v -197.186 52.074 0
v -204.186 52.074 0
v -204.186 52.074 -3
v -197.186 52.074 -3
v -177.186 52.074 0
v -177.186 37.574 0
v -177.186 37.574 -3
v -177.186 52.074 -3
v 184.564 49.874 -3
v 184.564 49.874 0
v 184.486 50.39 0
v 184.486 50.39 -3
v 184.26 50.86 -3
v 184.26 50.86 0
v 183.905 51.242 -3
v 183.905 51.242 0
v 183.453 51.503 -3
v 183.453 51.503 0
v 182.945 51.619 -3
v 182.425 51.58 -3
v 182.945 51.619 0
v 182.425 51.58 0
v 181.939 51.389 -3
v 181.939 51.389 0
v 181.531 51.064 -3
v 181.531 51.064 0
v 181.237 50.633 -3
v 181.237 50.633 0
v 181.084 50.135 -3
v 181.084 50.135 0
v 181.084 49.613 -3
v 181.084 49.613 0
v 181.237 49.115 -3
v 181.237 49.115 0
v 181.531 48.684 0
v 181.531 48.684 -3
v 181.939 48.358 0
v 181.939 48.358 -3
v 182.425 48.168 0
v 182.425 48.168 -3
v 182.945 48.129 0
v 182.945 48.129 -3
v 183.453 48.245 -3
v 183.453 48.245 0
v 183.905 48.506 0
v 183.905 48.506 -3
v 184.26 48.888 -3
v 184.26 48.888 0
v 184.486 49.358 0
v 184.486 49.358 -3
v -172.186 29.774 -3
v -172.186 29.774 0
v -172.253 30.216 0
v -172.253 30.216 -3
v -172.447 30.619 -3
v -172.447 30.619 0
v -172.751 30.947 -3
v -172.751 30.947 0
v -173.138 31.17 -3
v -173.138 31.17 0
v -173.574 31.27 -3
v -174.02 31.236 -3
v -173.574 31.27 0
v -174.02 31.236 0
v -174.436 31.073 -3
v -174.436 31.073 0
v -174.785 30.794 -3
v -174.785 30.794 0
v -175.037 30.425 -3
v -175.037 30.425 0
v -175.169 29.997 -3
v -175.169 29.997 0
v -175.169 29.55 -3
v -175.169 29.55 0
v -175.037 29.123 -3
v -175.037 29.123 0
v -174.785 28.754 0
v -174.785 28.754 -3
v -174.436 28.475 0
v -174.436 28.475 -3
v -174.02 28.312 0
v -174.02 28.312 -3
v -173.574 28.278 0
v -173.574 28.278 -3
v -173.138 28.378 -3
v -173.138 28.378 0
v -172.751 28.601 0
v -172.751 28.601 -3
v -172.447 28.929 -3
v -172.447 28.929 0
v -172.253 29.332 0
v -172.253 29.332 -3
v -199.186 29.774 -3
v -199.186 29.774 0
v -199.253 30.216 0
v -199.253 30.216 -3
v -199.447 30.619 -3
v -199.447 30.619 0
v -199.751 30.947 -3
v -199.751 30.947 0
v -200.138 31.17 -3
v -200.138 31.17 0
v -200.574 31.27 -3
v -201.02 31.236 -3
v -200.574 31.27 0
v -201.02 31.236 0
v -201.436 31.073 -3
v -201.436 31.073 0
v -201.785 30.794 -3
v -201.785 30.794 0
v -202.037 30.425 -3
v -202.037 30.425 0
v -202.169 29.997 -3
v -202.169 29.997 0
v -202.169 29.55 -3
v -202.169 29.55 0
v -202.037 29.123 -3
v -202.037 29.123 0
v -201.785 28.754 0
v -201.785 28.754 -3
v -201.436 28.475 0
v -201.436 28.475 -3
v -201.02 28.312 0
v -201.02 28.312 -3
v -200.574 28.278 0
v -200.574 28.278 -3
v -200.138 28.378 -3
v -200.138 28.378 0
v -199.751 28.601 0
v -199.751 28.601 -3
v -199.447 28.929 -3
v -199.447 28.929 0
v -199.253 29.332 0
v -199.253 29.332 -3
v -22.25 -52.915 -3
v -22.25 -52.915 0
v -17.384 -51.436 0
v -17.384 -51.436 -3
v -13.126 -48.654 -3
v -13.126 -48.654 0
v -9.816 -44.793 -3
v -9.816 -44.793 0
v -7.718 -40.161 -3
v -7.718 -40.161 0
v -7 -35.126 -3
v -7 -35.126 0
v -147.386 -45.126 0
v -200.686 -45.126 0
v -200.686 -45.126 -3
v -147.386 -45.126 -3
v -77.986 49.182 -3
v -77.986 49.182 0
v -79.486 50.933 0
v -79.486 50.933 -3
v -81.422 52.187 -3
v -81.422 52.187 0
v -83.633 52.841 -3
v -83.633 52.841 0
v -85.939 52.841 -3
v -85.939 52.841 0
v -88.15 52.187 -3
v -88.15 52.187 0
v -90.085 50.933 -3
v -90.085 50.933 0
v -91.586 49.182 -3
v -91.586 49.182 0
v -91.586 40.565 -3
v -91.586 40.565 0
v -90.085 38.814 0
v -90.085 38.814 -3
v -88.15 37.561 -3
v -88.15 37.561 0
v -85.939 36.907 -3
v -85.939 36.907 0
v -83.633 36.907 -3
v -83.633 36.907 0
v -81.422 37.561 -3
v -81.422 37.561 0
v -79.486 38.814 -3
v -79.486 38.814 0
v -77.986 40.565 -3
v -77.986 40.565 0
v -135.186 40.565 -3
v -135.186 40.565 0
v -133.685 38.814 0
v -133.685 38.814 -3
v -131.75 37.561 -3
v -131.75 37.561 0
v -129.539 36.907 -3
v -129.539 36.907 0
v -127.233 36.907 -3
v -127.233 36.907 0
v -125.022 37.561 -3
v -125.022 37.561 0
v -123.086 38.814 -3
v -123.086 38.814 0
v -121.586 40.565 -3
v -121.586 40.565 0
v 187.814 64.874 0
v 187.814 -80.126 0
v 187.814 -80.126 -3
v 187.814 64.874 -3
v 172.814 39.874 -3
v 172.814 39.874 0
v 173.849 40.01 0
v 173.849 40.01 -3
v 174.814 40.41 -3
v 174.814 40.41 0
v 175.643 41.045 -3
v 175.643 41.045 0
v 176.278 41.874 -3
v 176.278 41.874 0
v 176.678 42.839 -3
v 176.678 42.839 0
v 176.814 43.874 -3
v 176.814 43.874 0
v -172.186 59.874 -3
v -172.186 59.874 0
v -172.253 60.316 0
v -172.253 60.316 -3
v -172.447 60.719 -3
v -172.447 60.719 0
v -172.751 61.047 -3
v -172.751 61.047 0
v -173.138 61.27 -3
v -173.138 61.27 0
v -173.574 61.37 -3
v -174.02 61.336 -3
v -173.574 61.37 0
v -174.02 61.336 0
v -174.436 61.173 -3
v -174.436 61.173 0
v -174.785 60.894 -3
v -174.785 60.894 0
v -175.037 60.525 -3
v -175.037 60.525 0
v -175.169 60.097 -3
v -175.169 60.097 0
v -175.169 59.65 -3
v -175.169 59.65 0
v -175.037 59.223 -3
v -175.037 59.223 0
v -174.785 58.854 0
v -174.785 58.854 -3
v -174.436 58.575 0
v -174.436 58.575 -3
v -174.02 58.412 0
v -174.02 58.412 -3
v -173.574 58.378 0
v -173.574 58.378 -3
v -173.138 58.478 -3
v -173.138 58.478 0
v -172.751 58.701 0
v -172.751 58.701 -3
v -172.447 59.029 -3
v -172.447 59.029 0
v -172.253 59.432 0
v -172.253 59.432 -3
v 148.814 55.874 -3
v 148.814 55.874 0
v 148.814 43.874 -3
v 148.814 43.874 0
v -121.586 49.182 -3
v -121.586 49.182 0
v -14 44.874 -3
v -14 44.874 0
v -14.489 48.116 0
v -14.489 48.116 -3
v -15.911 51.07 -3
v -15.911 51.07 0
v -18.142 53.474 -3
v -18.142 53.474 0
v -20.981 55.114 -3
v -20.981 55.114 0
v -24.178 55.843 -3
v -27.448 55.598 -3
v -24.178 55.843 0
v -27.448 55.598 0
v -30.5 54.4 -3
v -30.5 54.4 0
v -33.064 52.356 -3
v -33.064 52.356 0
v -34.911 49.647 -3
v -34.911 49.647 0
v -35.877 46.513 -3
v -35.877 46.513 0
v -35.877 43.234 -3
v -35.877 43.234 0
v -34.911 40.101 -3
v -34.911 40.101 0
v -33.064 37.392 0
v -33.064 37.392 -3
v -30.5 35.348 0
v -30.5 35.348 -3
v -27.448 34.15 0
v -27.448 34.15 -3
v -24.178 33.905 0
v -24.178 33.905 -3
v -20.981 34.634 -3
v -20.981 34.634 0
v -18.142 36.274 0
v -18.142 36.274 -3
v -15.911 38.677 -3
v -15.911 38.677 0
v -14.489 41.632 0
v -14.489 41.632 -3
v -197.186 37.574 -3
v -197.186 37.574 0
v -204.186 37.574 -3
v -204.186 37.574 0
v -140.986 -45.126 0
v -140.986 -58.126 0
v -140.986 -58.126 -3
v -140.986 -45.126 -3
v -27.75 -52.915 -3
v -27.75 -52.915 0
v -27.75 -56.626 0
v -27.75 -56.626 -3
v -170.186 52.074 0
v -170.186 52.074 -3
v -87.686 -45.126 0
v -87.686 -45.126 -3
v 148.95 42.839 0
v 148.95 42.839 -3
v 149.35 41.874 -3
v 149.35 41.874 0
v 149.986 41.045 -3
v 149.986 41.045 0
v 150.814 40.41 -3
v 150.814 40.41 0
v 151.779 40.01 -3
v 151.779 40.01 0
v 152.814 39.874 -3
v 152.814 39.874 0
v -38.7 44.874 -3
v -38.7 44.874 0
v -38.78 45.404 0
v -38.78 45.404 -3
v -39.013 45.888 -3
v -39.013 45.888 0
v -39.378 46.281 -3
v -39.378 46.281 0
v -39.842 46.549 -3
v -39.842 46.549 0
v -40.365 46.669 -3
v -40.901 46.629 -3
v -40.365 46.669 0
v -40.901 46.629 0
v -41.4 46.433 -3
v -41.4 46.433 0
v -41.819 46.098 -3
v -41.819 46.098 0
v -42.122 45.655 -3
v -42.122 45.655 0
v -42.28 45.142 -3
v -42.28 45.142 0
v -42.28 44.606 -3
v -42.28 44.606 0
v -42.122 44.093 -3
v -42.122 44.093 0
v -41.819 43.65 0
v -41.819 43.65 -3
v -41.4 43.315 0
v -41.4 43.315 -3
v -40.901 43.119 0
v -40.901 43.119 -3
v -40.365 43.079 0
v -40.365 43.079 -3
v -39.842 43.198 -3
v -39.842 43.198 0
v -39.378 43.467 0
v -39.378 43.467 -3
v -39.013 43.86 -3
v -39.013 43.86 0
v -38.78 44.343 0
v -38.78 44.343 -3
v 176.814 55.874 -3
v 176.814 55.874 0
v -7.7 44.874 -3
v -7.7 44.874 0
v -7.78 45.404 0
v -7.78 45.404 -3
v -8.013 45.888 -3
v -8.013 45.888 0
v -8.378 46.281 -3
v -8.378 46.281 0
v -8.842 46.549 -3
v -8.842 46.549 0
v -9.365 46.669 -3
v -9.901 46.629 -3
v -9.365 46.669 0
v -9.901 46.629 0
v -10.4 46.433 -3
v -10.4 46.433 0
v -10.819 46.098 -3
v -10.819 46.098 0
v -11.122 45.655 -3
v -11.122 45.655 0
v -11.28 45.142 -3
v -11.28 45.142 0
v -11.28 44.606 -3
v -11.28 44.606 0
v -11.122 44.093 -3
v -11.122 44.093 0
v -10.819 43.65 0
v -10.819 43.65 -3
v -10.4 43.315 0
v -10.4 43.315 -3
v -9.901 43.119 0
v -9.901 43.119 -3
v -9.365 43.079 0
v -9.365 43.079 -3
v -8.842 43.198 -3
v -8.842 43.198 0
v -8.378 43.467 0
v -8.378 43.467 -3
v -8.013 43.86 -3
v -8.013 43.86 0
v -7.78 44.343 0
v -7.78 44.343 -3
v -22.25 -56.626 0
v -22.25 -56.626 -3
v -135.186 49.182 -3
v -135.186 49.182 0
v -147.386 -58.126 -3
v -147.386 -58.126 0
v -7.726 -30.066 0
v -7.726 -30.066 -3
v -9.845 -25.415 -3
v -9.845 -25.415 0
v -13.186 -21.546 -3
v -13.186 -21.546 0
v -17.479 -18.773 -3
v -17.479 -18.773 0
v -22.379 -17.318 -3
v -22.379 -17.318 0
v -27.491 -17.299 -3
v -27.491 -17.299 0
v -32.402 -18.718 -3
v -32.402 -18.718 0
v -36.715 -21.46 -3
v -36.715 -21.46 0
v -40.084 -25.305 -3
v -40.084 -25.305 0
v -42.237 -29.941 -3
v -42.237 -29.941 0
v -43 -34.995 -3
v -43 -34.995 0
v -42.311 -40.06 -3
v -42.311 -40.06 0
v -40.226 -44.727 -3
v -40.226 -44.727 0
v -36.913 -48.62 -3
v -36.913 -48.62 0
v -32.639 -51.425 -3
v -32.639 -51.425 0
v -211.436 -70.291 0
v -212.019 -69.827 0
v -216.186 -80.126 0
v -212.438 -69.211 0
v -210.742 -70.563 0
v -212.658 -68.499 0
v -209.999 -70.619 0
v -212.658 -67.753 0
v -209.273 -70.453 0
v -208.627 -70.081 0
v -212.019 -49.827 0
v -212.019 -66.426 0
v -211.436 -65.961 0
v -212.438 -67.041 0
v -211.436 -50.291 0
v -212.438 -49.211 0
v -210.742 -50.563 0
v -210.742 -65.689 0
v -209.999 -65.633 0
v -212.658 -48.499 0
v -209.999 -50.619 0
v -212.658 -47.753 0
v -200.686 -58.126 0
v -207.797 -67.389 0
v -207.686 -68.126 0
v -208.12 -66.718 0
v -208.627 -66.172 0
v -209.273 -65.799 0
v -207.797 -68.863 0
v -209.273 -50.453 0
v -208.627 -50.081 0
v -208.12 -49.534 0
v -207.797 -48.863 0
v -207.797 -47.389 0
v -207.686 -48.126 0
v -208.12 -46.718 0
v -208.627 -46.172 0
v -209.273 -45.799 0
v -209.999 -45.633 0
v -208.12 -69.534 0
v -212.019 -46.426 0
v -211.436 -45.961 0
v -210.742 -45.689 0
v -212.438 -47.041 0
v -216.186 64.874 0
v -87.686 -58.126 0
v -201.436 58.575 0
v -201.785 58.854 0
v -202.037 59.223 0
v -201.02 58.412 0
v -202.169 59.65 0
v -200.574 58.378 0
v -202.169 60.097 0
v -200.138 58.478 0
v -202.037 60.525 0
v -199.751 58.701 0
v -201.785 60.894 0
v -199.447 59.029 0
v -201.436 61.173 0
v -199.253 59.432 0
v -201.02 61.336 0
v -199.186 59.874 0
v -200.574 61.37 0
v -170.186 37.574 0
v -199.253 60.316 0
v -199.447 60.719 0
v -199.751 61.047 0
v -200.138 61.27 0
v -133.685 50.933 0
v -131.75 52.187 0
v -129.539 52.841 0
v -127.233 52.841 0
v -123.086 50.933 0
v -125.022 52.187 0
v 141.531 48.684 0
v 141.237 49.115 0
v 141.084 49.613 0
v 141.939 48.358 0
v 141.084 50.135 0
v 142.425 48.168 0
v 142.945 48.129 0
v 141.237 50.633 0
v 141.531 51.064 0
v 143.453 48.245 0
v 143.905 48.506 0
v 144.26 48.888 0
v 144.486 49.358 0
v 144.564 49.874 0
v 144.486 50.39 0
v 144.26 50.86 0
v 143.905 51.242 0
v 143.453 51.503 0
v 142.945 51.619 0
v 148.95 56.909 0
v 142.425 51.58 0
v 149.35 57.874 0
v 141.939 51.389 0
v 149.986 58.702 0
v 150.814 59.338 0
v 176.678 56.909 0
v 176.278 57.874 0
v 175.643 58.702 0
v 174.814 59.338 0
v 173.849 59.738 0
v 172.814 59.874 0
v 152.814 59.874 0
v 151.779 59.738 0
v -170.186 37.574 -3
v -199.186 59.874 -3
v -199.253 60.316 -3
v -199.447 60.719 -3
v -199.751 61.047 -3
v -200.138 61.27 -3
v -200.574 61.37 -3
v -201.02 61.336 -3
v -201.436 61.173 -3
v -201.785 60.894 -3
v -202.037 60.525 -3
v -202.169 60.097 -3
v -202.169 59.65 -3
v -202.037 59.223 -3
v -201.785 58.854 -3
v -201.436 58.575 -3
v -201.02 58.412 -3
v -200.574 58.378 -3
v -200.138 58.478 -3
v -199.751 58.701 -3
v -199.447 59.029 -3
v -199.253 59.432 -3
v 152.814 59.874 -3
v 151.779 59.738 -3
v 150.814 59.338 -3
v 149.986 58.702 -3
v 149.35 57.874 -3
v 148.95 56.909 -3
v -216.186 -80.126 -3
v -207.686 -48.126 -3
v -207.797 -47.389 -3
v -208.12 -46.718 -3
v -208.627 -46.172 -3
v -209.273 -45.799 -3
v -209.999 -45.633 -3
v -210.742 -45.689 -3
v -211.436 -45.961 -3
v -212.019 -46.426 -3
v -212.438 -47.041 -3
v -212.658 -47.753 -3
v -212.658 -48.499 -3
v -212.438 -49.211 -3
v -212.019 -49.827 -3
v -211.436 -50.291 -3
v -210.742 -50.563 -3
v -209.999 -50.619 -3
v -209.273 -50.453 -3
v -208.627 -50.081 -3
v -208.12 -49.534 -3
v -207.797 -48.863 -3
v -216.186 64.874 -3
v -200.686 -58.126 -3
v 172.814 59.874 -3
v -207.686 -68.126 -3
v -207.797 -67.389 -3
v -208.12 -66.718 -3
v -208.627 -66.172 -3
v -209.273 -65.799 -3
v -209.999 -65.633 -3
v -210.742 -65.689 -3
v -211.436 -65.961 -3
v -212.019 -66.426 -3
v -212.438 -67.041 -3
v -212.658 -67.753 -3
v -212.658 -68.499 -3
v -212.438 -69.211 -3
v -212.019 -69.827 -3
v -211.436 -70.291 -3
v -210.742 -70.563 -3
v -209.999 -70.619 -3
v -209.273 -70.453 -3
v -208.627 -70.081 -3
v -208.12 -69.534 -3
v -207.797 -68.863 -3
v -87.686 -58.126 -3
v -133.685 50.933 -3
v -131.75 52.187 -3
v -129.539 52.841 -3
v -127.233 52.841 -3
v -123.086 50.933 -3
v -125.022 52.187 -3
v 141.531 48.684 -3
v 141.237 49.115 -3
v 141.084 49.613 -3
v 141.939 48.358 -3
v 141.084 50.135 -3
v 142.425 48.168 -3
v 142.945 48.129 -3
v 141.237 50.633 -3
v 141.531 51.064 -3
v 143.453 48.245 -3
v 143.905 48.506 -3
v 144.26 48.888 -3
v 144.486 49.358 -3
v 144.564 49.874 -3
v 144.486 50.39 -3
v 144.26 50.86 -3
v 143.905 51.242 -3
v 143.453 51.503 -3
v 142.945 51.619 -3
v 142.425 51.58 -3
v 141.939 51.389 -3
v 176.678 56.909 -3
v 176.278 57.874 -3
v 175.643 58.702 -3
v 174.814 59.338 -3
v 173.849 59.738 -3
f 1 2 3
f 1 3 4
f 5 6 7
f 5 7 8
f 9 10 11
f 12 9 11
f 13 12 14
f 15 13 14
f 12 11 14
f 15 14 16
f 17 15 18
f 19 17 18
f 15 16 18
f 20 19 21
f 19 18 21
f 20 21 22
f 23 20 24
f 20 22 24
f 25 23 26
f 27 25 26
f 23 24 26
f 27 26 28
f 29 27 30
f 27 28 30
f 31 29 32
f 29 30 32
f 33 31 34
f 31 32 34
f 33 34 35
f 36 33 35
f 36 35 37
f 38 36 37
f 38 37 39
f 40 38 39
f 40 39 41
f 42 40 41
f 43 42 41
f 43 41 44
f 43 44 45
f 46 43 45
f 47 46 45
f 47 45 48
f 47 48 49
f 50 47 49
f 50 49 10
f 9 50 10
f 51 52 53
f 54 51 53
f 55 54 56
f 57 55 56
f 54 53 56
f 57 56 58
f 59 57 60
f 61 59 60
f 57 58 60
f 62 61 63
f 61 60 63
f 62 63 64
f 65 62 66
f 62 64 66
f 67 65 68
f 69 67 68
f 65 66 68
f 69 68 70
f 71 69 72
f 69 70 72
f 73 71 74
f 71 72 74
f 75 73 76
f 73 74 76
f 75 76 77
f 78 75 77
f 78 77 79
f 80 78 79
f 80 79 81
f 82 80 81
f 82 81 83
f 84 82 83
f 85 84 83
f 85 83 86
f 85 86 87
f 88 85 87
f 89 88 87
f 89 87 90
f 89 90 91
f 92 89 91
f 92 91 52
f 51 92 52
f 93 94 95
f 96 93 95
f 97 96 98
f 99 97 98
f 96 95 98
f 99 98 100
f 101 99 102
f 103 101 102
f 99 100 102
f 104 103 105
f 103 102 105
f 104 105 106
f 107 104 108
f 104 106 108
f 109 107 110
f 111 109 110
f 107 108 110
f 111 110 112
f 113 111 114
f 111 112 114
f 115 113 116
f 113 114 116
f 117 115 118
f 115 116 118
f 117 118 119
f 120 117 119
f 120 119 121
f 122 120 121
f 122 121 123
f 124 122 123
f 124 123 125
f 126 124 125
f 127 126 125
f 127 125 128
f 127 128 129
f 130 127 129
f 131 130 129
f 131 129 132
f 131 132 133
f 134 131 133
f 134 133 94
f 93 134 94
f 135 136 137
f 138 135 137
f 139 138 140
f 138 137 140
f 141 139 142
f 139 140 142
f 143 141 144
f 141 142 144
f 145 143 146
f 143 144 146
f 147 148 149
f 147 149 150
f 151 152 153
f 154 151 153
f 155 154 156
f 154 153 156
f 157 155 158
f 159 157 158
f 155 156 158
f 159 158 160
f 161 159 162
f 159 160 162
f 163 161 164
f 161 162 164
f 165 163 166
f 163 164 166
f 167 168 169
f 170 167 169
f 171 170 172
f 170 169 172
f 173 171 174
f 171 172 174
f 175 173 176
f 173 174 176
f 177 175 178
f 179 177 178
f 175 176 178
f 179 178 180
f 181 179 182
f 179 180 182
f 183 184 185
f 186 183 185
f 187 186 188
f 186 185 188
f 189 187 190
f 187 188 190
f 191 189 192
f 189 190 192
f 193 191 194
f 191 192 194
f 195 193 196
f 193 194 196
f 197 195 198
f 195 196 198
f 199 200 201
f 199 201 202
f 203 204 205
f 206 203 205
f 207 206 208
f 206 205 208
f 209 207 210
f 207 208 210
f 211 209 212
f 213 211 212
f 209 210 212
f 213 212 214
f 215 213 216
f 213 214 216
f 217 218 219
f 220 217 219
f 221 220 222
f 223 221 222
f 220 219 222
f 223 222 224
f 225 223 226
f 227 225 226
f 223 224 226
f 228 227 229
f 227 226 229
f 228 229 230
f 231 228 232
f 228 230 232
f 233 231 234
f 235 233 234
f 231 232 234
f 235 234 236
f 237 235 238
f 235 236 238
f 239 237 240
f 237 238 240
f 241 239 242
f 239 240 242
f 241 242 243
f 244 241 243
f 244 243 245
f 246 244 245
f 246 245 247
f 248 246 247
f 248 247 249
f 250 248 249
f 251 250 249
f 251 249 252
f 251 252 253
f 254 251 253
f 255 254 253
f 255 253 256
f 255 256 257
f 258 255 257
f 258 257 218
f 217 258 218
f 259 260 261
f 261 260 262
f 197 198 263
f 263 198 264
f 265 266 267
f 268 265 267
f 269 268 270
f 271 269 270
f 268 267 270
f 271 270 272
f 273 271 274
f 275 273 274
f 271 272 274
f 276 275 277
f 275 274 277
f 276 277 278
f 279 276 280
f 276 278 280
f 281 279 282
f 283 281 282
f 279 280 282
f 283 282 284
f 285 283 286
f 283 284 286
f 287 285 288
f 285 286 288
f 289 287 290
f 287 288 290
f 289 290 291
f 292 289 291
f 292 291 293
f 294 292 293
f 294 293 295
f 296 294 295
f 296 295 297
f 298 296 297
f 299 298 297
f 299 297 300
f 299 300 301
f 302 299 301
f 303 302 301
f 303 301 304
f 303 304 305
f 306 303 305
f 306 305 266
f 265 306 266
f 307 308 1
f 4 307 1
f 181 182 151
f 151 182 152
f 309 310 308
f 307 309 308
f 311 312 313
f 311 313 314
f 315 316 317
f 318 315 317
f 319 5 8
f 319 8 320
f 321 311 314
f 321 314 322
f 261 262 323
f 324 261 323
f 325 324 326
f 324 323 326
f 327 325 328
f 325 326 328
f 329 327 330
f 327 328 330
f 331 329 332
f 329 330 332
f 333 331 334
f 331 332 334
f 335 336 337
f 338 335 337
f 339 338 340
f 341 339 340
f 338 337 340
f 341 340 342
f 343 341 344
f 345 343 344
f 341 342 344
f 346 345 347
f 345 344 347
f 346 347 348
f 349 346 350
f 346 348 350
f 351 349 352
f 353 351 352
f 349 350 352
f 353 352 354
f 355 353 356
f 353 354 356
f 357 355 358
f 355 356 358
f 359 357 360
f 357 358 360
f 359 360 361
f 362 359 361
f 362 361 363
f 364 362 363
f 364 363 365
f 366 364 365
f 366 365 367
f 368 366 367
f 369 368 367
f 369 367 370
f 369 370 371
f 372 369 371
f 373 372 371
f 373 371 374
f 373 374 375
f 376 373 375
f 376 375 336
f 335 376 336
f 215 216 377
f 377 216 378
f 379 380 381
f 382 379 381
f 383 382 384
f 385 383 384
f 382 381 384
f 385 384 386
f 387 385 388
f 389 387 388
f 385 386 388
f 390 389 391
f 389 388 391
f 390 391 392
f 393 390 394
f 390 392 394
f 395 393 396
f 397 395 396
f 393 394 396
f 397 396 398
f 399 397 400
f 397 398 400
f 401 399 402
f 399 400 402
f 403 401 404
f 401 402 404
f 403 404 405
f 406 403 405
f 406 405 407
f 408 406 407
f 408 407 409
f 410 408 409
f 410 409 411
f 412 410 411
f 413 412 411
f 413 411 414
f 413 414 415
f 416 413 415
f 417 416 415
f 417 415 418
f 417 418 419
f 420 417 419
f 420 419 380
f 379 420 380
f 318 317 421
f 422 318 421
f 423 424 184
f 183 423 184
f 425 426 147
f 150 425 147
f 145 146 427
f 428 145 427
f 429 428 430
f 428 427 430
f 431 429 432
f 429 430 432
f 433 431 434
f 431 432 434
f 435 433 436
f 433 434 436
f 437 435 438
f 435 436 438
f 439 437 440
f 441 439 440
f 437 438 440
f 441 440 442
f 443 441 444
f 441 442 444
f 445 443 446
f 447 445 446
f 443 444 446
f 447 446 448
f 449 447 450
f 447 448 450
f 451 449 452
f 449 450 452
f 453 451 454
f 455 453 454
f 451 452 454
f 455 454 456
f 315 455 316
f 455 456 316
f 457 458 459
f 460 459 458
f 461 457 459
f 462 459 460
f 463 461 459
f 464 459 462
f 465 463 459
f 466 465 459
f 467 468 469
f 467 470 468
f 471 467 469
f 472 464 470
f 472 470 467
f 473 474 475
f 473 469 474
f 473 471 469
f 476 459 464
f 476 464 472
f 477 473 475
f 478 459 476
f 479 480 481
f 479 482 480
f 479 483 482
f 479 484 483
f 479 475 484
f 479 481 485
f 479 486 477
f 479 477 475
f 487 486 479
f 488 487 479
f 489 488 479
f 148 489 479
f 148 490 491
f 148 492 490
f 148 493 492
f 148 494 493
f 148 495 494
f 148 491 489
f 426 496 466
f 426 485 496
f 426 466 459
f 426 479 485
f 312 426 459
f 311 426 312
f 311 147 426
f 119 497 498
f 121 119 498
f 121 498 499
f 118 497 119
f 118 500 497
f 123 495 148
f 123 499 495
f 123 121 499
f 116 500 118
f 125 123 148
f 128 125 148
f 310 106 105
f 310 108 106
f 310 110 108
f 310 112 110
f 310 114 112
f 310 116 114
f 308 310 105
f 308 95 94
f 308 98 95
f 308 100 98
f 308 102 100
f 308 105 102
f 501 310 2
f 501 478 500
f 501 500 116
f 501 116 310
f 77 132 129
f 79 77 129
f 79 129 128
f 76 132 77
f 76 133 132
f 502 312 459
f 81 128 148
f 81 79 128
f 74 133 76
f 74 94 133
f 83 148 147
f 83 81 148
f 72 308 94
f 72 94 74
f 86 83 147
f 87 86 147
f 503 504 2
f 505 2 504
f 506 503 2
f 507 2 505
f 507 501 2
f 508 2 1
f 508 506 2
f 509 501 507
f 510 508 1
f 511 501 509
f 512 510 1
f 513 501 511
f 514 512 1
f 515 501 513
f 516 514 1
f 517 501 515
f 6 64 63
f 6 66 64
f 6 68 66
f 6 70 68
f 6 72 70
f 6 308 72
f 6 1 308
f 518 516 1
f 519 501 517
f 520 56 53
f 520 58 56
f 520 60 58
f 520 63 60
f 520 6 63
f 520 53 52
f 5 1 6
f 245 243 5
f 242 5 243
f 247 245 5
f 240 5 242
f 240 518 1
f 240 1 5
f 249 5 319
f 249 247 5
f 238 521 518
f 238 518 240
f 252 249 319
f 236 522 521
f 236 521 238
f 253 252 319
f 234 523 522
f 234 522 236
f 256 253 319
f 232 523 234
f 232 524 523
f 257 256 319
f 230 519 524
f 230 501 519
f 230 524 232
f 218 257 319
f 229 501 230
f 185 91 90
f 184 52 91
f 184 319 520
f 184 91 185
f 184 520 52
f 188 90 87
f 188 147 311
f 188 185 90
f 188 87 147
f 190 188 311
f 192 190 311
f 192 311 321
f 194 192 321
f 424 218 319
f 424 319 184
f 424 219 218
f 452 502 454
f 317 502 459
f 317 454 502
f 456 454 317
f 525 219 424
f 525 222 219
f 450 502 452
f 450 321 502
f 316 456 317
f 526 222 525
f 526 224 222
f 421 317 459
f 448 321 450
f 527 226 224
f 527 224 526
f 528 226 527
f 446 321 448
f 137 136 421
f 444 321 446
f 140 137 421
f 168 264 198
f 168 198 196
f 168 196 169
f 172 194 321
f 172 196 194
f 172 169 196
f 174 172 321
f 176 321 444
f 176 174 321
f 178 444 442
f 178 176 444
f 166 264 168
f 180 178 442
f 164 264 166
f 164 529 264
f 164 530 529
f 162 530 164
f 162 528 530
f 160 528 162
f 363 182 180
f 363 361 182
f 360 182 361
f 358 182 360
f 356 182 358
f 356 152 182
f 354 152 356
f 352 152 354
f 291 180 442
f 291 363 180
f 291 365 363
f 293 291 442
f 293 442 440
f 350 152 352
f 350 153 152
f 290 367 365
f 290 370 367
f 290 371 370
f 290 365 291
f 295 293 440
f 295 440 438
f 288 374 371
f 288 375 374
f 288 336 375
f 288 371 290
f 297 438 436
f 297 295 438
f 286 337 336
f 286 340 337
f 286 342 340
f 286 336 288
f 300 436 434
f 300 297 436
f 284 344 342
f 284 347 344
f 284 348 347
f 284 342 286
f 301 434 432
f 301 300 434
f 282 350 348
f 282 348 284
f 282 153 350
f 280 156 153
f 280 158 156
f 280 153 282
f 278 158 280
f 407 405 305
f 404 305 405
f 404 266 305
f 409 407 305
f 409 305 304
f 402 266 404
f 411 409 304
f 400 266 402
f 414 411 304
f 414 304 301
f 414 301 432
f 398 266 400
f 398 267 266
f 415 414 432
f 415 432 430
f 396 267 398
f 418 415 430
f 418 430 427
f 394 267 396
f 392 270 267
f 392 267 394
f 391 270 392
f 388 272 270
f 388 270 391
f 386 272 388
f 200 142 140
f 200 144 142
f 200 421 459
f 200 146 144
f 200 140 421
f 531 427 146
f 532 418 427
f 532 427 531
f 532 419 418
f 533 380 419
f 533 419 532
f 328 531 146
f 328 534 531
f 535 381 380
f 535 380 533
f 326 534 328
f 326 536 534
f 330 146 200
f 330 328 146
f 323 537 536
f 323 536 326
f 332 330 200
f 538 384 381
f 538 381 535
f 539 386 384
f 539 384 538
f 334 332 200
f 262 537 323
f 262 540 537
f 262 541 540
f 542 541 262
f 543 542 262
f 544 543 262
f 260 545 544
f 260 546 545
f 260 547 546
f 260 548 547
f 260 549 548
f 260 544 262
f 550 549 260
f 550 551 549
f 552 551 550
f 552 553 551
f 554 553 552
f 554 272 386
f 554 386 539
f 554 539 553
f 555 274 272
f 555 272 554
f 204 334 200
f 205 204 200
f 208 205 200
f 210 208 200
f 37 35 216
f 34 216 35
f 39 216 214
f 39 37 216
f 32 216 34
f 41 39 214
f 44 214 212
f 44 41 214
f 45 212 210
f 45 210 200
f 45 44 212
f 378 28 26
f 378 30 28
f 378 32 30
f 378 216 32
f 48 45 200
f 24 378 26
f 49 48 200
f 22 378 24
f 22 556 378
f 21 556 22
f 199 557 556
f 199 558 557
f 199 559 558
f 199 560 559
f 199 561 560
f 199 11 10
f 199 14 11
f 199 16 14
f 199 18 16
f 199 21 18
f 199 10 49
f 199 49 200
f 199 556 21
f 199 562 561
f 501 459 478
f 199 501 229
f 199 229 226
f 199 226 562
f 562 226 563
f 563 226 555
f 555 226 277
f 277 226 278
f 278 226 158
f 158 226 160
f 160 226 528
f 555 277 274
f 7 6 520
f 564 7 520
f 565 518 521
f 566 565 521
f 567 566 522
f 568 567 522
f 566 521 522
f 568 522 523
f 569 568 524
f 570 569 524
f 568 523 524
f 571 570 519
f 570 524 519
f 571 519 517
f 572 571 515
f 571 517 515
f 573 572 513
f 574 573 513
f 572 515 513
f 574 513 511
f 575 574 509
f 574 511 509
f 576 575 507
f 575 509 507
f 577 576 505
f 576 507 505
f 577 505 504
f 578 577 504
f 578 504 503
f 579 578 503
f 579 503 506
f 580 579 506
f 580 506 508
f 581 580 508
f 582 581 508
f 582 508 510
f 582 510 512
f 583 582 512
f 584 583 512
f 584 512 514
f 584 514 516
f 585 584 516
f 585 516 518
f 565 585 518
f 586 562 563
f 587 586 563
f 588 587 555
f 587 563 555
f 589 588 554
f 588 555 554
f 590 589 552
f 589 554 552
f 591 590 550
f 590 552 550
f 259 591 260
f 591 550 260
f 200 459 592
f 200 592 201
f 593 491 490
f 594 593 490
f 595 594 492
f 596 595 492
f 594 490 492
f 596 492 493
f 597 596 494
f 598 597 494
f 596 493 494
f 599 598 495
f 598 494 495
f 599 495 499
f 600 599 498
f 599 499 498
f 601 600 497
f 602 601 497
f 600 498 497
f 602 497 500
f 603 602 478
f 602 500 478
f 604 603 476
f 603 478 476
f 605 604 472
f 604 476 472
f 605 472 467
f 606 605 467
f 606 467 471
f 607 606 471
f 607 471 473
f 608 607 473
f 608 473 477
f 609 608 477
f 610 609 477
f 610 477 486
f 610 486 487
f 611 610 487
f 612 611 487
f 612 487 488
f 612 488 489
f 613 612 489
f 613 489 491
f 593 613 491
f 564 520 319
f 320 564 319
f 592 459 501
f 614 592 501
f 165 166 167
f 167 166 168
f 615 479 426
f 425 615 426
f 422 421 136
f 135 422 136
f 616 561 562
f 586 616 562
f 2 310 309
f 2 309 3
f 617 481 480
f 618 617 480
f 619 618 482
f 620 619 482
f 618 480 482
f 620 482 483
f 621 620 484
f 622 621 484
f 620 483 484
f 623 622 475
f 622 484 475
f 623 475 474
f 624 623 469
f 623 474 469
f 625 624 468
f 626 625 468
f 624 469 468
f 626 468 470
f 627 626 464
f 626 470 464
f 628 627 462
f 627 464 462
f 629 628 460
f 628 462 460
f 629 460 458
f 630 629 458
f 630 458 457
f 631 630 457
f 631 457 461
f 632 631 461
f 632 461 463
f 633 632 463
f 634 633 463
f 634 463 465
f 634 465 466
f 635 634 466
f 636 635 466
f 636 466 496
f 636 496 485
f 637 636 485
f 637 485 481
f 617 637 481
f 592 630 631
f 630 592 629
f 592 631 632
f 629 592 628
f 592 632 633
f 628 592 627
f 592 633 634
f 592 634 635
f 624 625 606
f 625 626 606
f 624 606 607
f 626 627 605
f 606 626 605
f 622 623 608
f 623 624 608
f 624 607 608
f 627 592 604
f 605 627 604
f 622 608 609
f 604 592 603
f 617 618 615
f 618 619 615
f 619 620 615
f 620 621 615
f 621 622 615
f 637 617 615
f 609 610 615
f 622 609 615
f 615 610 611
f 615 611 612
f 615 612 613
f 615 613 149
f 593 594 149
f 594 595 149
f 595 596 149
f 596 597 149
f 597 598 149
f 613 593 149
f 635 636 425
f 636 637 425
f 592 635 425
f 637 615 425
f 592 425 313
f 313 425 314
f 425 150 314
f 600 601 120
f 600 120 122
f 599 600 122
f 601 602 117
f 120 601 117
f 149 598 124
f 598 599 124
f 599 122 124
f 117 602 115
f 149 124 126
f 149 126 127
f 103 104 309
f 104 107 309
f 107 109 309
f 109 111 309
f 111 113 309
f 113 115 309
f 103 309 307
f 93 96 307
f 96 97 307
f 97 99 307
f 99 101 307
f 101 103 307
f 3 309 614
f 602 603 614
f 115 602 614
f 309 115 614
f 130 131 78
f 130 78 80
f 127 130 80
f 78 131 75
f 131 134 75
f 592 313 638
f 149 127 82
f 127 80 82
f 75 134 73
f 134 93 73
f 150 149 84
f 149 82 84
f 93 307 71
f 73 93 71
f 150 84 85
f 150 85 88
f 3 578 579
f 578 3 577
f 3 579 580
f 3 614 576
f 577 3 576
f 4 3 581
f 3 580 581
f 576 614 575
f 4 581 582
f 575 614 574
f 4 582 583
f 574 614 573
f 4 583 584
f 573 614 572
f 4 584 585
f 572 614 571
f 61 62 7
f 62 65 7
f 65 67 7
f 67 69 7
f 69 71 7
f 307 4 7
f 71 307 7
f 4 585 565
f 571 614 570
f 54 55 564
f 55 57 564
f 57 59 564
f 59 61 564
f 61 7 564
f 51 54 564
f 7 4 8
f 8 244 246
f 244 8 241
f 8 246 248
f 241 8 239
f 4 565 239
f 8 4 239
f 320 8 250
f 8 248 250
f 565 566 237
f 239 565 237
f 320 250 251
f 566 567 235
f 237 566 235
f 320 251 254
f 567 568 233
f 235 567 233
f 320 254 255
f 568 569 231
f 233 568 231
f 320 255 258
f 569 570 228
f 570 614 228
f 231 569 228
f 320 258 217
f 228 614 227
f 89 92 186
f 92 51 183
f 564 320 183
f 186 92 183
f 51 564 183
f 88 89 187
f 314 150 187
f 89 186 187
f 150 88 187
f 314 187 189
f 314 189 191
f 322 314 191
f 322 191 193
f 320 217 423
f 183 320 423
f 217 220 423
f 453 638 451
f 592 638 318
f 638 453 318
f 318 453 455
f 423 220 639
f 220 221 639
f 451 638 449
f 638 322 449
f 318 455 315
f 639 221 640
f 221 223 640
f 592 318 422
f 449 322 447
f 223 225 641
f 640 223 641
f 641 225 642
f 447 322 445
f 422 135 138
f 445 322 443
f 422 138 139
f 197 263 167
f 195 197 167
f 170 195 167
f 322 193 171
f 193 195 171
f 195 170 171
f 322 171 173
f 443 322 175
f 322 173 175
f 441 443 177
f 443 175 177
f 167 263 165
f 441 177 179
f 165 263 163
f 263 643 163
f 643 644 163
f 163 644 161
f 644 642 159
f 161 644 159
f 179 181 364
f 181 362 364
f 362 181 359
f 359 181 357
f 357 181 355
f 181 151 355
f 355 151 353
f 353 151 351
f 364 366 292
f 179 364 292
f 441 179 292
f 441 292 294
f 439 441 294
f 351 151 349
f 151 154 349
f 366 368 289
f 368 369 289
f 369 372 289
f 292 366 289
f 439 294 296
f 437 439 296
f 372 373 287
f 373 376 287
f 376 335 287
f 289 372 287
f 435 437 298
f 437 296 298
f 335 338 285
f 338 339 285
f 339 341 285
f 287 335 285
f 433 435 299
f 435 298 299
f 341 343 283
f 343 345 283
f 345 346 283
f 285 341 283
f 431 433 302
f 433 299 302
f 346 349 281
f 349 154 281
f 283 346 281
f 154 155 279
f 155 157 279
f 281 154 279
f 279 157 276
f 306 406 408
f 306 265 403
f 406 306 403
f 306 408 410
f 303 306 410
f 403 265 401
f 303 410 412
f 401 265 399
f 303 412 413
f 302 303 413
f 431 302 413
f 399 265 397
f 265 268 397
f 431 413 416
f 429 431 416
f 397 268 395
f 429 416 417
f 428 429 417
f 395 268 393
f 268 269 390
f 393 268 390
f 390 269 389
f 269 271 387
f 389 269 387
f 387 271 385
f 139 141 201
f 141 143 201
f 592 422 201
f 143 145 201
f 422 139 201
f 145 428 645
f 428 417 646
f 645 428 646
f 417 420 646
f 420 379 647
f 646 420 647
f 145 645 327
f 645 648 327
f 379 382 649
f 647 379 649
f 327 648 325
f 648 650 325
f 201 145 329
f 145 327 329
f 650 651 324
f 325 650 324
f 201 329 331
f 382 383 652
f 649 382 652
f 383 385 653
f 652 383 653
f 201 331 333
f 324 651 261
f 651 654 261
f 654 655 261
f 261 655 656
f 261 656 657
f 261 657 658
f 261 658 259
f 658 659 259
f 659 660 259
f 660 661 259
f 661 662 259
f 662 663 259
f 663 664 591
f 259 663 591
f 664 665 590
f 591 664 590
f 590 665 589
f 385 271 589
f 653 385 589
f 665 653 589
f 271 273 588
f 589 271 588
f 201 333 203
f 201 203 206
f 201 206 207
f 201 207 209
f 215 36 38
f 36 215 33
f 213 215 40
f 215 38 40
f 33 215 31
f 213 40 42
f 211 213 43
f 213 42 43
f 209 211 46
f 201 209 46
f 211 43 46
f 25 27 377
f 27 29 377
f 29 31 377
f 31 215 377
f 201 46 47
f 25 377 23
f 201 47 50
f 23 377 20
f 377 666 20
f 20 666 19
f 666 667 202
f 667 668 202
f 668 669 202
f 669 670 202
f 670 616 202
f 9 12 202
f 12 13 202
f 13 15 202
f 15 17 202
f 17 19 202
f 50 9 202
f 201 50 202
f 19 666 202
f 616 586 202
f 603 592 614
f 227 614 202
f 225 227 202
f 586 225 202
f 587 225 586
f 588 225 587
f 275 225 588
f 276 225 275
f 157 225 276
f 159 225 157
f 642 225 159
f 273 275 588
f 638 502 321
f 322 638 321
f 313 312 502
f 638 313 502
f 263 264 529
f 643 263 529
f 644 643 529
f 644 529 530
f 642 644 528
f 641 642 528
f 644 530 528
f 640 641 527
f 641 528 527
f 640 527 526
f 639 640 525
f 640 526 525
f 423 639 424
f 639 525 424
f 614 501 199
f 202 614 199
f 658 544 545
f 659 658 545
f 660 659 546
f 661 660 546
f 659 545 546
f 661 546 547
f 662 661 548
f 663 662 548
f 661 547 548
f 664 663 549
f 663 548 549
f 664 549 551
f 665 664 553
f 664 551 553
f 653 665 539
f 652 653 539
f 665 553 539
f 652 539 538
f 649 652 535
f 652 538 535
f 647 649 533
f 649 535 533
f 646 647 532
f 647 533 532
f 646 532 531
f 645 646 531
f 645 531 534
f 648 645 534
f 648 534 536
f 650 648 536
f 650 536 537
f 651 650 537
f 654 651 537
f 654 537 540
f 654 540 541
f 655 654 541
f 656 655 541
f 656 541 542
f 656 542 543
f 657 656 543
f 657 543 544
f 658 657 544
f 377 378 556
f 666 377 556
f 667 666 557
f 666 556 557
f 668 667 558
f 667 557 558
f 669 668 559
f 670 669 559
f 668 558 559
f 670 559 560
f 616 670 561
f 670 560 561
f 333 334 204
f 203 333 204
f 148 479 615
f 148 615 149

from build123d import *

# Parameters (mm, degrees)
F0_W     = 404
F0_H     = 145
F2_DEPTH = 3
F1_R     = 2.5
F1_R_2   = 11
F1_R_3   = 1.8
F1_R_4   = 1.75
F1_W     = 53.3
F1_H     = 13
F1_W_2   = 7
F1_H_2   = 14.5
F1_R_5   = 1.5
F3_DEPTH = 25


with BuildPart() as f2:
    # F0 (on Top) → F2 (new body)
    with BuildSketch(Plane.XY):
        with Locations((-14.1859020234, -7.6260944492)):
            Rectangle(F0_W, F0_H)
    extrude(amount=-F2_DEPTH)

    # F1 (on Top) → F3 (cut)
    with BuildSketch(Plane.XY):
        with Locations((-210.1859020234, -68.1260944492)):
            Circle(F1_R)
        with BuildLine():
            Line((-135.1859020234, 49.1823275357), (-135.1859020234, 40.5654835659))
            ThreePointArc((-135.1859020234, 40.5654835659), (-128.3859020234, 36.8239055508), (-121.5859020234, 40.5654835659))
            Line((-121.5859020234, 40.5654835659), (-121.5859020234, 49.1823275357))
            ThreePointArc((-121.5859020234, 49.1823275357), (-128.3859020234, 52.9239055508), (-135.1859020234, 49.1823275357))
        make_face()
        with BuildLine():
            ThreePointArc((-22.25, -52.9147846764), (-11.3343496313, -46.8414689631), (-7, -35.1260944492))
            ThreePointArc((-7, -35.1260944492), (-36.7153745139, -21.4604440805), (-27.75, -52.9147846764))
            Line((-27.75, -52.9147846764), (-27.75, -31.4030106551))
            Line((-27.75, -31.4030106551), (-22.25, -31.4030106551))
            Line((-22.25, -31.4030106551), (-22.25, -52.9147846764))
        make_face()
        with BuildLine():
            Line((-27.75, -31.4030106551), (-27.75, -52.9147846764))
            ThreePointArc((-27.75, -52.9147846764), (-25, -53.1260944492), (-22.25, -52.9147846764))
            Line((-22.25, -52.9147846764), (-22.25, -31.4030106551))
            Line((-22.25, -31.4030106551), (-27.75, -31.4030106551))
        make_face()
        with BuildLine():
            ThreePointArc((-22.25, -52.9147846764), (-25, -53.1260944492), (-27.75, -52.9147846764))
            Line((-27.75, -52.9147846764), (-27.75, -56.6260944492))
            Line((-27.75, -56.6260944492), (-22.25, -56.6260944492))
            Line((-22.25, -56.6260944492), (-22.25, -52.9147846764))
        make_face()
        with Locations((-25, 44.8739055508)):
            Circle(F1_R_2)
        with Locations((-40.5, 44.8739055508)):
            Circle(F1_R_3)
        with Locations((-9.5, 44.8739055508)):
            Circle(F1_R_3)
        with Locations((-210.1859020234, -48.1260944492)):
            Circle(F1_R)
        with BuildLine():
            Line((152.8140979766, 39.8739055508), (172.8140979766, 39.8739055508))
            ThreePointArc((172.8140979766, 39.8739055508), (175.6425251014, 41.045478426), (176.8140979766, 43.8739055508))
            Line((176.8140979766, 43.8739055508), (176.8140979766, 55.8739055508))
            ThreePointArc((176.8140979766, 55.8739055508), (175.6425251014, 58.7023326755), (172.8140979766, 59.8739055508))
            Line((172.8140979766, 59.8739055508), (152.8140979766, 59.8739055508))
            ThreePointArc((152.8140979766, 59.8739055508), (149.9856708519, 58.7023326755), (148.8140979766, 55.8739055508))
            Line((148.8140979766, 55.8739055508), (148.8140979766, 43.8739055508))
            ThreePointArc((148.8140979766, 43.8739055508), (149.9856708519, 41.045478426), (152.8140979766, 39.8739055508))
        make_face()
        with Locations((142.8140979766, 49.8739055508)):
            Circle(F1_R_4)
        with Locations((182.8140979766, 49.8739055508)):
            Circle(F1_R_4)
        with Locations((-174.0359020234, -51.6260944492)):
            Rectangle(F1_W, F1_H)
        with Locations((-114.3359020234, -51.6260944492)):
            Rectangle(F1_W, F1_H)
        with Locations((-200.6859020234, 44.8239055508)):
            Rectangle(F1_W_2, F1_H_2)
        with Locations((-200.6859020234, 59.8739055508)):
            Circle(F1_R_5)
        with Locations((-200.6859020234, 29.7739055508)):
            Circle(F1_R_5)
        with Locations((-173.6859020234, 44.8239055508)):
            Rectangle(F1_W_2, F1_H_2)
        with Locations((-173.6859020234, 59.8739055508)):
            Circle(F1_R_5)
        with Locations((-173.6859020234, 29.7739055508)):
            Circle(F1_R_5)
        with BuildLine():
            Line((-91.5859020234, 49.1823275357), (-91.5859020234, 40.5654835659))
            ThreePointArc((-91.5859020234, 40.5654835659), (-84.7859020234, 36.8239055508), (-77.9859020234, 40.5654835659))
            Line((-77.9859020234, 40.5654835659), (-77.9859020234, 49.1823275357))
            ThreePointArc((-77.9859020234, 49.1823275357), (-84.7859020234, 52.9239055508), (-91.5859020234, 49.1823275357))
        make_face()
    extrude(amount=-F3_DEPTH, mode=Mode.SUBTRACT)


solid = f2.part
